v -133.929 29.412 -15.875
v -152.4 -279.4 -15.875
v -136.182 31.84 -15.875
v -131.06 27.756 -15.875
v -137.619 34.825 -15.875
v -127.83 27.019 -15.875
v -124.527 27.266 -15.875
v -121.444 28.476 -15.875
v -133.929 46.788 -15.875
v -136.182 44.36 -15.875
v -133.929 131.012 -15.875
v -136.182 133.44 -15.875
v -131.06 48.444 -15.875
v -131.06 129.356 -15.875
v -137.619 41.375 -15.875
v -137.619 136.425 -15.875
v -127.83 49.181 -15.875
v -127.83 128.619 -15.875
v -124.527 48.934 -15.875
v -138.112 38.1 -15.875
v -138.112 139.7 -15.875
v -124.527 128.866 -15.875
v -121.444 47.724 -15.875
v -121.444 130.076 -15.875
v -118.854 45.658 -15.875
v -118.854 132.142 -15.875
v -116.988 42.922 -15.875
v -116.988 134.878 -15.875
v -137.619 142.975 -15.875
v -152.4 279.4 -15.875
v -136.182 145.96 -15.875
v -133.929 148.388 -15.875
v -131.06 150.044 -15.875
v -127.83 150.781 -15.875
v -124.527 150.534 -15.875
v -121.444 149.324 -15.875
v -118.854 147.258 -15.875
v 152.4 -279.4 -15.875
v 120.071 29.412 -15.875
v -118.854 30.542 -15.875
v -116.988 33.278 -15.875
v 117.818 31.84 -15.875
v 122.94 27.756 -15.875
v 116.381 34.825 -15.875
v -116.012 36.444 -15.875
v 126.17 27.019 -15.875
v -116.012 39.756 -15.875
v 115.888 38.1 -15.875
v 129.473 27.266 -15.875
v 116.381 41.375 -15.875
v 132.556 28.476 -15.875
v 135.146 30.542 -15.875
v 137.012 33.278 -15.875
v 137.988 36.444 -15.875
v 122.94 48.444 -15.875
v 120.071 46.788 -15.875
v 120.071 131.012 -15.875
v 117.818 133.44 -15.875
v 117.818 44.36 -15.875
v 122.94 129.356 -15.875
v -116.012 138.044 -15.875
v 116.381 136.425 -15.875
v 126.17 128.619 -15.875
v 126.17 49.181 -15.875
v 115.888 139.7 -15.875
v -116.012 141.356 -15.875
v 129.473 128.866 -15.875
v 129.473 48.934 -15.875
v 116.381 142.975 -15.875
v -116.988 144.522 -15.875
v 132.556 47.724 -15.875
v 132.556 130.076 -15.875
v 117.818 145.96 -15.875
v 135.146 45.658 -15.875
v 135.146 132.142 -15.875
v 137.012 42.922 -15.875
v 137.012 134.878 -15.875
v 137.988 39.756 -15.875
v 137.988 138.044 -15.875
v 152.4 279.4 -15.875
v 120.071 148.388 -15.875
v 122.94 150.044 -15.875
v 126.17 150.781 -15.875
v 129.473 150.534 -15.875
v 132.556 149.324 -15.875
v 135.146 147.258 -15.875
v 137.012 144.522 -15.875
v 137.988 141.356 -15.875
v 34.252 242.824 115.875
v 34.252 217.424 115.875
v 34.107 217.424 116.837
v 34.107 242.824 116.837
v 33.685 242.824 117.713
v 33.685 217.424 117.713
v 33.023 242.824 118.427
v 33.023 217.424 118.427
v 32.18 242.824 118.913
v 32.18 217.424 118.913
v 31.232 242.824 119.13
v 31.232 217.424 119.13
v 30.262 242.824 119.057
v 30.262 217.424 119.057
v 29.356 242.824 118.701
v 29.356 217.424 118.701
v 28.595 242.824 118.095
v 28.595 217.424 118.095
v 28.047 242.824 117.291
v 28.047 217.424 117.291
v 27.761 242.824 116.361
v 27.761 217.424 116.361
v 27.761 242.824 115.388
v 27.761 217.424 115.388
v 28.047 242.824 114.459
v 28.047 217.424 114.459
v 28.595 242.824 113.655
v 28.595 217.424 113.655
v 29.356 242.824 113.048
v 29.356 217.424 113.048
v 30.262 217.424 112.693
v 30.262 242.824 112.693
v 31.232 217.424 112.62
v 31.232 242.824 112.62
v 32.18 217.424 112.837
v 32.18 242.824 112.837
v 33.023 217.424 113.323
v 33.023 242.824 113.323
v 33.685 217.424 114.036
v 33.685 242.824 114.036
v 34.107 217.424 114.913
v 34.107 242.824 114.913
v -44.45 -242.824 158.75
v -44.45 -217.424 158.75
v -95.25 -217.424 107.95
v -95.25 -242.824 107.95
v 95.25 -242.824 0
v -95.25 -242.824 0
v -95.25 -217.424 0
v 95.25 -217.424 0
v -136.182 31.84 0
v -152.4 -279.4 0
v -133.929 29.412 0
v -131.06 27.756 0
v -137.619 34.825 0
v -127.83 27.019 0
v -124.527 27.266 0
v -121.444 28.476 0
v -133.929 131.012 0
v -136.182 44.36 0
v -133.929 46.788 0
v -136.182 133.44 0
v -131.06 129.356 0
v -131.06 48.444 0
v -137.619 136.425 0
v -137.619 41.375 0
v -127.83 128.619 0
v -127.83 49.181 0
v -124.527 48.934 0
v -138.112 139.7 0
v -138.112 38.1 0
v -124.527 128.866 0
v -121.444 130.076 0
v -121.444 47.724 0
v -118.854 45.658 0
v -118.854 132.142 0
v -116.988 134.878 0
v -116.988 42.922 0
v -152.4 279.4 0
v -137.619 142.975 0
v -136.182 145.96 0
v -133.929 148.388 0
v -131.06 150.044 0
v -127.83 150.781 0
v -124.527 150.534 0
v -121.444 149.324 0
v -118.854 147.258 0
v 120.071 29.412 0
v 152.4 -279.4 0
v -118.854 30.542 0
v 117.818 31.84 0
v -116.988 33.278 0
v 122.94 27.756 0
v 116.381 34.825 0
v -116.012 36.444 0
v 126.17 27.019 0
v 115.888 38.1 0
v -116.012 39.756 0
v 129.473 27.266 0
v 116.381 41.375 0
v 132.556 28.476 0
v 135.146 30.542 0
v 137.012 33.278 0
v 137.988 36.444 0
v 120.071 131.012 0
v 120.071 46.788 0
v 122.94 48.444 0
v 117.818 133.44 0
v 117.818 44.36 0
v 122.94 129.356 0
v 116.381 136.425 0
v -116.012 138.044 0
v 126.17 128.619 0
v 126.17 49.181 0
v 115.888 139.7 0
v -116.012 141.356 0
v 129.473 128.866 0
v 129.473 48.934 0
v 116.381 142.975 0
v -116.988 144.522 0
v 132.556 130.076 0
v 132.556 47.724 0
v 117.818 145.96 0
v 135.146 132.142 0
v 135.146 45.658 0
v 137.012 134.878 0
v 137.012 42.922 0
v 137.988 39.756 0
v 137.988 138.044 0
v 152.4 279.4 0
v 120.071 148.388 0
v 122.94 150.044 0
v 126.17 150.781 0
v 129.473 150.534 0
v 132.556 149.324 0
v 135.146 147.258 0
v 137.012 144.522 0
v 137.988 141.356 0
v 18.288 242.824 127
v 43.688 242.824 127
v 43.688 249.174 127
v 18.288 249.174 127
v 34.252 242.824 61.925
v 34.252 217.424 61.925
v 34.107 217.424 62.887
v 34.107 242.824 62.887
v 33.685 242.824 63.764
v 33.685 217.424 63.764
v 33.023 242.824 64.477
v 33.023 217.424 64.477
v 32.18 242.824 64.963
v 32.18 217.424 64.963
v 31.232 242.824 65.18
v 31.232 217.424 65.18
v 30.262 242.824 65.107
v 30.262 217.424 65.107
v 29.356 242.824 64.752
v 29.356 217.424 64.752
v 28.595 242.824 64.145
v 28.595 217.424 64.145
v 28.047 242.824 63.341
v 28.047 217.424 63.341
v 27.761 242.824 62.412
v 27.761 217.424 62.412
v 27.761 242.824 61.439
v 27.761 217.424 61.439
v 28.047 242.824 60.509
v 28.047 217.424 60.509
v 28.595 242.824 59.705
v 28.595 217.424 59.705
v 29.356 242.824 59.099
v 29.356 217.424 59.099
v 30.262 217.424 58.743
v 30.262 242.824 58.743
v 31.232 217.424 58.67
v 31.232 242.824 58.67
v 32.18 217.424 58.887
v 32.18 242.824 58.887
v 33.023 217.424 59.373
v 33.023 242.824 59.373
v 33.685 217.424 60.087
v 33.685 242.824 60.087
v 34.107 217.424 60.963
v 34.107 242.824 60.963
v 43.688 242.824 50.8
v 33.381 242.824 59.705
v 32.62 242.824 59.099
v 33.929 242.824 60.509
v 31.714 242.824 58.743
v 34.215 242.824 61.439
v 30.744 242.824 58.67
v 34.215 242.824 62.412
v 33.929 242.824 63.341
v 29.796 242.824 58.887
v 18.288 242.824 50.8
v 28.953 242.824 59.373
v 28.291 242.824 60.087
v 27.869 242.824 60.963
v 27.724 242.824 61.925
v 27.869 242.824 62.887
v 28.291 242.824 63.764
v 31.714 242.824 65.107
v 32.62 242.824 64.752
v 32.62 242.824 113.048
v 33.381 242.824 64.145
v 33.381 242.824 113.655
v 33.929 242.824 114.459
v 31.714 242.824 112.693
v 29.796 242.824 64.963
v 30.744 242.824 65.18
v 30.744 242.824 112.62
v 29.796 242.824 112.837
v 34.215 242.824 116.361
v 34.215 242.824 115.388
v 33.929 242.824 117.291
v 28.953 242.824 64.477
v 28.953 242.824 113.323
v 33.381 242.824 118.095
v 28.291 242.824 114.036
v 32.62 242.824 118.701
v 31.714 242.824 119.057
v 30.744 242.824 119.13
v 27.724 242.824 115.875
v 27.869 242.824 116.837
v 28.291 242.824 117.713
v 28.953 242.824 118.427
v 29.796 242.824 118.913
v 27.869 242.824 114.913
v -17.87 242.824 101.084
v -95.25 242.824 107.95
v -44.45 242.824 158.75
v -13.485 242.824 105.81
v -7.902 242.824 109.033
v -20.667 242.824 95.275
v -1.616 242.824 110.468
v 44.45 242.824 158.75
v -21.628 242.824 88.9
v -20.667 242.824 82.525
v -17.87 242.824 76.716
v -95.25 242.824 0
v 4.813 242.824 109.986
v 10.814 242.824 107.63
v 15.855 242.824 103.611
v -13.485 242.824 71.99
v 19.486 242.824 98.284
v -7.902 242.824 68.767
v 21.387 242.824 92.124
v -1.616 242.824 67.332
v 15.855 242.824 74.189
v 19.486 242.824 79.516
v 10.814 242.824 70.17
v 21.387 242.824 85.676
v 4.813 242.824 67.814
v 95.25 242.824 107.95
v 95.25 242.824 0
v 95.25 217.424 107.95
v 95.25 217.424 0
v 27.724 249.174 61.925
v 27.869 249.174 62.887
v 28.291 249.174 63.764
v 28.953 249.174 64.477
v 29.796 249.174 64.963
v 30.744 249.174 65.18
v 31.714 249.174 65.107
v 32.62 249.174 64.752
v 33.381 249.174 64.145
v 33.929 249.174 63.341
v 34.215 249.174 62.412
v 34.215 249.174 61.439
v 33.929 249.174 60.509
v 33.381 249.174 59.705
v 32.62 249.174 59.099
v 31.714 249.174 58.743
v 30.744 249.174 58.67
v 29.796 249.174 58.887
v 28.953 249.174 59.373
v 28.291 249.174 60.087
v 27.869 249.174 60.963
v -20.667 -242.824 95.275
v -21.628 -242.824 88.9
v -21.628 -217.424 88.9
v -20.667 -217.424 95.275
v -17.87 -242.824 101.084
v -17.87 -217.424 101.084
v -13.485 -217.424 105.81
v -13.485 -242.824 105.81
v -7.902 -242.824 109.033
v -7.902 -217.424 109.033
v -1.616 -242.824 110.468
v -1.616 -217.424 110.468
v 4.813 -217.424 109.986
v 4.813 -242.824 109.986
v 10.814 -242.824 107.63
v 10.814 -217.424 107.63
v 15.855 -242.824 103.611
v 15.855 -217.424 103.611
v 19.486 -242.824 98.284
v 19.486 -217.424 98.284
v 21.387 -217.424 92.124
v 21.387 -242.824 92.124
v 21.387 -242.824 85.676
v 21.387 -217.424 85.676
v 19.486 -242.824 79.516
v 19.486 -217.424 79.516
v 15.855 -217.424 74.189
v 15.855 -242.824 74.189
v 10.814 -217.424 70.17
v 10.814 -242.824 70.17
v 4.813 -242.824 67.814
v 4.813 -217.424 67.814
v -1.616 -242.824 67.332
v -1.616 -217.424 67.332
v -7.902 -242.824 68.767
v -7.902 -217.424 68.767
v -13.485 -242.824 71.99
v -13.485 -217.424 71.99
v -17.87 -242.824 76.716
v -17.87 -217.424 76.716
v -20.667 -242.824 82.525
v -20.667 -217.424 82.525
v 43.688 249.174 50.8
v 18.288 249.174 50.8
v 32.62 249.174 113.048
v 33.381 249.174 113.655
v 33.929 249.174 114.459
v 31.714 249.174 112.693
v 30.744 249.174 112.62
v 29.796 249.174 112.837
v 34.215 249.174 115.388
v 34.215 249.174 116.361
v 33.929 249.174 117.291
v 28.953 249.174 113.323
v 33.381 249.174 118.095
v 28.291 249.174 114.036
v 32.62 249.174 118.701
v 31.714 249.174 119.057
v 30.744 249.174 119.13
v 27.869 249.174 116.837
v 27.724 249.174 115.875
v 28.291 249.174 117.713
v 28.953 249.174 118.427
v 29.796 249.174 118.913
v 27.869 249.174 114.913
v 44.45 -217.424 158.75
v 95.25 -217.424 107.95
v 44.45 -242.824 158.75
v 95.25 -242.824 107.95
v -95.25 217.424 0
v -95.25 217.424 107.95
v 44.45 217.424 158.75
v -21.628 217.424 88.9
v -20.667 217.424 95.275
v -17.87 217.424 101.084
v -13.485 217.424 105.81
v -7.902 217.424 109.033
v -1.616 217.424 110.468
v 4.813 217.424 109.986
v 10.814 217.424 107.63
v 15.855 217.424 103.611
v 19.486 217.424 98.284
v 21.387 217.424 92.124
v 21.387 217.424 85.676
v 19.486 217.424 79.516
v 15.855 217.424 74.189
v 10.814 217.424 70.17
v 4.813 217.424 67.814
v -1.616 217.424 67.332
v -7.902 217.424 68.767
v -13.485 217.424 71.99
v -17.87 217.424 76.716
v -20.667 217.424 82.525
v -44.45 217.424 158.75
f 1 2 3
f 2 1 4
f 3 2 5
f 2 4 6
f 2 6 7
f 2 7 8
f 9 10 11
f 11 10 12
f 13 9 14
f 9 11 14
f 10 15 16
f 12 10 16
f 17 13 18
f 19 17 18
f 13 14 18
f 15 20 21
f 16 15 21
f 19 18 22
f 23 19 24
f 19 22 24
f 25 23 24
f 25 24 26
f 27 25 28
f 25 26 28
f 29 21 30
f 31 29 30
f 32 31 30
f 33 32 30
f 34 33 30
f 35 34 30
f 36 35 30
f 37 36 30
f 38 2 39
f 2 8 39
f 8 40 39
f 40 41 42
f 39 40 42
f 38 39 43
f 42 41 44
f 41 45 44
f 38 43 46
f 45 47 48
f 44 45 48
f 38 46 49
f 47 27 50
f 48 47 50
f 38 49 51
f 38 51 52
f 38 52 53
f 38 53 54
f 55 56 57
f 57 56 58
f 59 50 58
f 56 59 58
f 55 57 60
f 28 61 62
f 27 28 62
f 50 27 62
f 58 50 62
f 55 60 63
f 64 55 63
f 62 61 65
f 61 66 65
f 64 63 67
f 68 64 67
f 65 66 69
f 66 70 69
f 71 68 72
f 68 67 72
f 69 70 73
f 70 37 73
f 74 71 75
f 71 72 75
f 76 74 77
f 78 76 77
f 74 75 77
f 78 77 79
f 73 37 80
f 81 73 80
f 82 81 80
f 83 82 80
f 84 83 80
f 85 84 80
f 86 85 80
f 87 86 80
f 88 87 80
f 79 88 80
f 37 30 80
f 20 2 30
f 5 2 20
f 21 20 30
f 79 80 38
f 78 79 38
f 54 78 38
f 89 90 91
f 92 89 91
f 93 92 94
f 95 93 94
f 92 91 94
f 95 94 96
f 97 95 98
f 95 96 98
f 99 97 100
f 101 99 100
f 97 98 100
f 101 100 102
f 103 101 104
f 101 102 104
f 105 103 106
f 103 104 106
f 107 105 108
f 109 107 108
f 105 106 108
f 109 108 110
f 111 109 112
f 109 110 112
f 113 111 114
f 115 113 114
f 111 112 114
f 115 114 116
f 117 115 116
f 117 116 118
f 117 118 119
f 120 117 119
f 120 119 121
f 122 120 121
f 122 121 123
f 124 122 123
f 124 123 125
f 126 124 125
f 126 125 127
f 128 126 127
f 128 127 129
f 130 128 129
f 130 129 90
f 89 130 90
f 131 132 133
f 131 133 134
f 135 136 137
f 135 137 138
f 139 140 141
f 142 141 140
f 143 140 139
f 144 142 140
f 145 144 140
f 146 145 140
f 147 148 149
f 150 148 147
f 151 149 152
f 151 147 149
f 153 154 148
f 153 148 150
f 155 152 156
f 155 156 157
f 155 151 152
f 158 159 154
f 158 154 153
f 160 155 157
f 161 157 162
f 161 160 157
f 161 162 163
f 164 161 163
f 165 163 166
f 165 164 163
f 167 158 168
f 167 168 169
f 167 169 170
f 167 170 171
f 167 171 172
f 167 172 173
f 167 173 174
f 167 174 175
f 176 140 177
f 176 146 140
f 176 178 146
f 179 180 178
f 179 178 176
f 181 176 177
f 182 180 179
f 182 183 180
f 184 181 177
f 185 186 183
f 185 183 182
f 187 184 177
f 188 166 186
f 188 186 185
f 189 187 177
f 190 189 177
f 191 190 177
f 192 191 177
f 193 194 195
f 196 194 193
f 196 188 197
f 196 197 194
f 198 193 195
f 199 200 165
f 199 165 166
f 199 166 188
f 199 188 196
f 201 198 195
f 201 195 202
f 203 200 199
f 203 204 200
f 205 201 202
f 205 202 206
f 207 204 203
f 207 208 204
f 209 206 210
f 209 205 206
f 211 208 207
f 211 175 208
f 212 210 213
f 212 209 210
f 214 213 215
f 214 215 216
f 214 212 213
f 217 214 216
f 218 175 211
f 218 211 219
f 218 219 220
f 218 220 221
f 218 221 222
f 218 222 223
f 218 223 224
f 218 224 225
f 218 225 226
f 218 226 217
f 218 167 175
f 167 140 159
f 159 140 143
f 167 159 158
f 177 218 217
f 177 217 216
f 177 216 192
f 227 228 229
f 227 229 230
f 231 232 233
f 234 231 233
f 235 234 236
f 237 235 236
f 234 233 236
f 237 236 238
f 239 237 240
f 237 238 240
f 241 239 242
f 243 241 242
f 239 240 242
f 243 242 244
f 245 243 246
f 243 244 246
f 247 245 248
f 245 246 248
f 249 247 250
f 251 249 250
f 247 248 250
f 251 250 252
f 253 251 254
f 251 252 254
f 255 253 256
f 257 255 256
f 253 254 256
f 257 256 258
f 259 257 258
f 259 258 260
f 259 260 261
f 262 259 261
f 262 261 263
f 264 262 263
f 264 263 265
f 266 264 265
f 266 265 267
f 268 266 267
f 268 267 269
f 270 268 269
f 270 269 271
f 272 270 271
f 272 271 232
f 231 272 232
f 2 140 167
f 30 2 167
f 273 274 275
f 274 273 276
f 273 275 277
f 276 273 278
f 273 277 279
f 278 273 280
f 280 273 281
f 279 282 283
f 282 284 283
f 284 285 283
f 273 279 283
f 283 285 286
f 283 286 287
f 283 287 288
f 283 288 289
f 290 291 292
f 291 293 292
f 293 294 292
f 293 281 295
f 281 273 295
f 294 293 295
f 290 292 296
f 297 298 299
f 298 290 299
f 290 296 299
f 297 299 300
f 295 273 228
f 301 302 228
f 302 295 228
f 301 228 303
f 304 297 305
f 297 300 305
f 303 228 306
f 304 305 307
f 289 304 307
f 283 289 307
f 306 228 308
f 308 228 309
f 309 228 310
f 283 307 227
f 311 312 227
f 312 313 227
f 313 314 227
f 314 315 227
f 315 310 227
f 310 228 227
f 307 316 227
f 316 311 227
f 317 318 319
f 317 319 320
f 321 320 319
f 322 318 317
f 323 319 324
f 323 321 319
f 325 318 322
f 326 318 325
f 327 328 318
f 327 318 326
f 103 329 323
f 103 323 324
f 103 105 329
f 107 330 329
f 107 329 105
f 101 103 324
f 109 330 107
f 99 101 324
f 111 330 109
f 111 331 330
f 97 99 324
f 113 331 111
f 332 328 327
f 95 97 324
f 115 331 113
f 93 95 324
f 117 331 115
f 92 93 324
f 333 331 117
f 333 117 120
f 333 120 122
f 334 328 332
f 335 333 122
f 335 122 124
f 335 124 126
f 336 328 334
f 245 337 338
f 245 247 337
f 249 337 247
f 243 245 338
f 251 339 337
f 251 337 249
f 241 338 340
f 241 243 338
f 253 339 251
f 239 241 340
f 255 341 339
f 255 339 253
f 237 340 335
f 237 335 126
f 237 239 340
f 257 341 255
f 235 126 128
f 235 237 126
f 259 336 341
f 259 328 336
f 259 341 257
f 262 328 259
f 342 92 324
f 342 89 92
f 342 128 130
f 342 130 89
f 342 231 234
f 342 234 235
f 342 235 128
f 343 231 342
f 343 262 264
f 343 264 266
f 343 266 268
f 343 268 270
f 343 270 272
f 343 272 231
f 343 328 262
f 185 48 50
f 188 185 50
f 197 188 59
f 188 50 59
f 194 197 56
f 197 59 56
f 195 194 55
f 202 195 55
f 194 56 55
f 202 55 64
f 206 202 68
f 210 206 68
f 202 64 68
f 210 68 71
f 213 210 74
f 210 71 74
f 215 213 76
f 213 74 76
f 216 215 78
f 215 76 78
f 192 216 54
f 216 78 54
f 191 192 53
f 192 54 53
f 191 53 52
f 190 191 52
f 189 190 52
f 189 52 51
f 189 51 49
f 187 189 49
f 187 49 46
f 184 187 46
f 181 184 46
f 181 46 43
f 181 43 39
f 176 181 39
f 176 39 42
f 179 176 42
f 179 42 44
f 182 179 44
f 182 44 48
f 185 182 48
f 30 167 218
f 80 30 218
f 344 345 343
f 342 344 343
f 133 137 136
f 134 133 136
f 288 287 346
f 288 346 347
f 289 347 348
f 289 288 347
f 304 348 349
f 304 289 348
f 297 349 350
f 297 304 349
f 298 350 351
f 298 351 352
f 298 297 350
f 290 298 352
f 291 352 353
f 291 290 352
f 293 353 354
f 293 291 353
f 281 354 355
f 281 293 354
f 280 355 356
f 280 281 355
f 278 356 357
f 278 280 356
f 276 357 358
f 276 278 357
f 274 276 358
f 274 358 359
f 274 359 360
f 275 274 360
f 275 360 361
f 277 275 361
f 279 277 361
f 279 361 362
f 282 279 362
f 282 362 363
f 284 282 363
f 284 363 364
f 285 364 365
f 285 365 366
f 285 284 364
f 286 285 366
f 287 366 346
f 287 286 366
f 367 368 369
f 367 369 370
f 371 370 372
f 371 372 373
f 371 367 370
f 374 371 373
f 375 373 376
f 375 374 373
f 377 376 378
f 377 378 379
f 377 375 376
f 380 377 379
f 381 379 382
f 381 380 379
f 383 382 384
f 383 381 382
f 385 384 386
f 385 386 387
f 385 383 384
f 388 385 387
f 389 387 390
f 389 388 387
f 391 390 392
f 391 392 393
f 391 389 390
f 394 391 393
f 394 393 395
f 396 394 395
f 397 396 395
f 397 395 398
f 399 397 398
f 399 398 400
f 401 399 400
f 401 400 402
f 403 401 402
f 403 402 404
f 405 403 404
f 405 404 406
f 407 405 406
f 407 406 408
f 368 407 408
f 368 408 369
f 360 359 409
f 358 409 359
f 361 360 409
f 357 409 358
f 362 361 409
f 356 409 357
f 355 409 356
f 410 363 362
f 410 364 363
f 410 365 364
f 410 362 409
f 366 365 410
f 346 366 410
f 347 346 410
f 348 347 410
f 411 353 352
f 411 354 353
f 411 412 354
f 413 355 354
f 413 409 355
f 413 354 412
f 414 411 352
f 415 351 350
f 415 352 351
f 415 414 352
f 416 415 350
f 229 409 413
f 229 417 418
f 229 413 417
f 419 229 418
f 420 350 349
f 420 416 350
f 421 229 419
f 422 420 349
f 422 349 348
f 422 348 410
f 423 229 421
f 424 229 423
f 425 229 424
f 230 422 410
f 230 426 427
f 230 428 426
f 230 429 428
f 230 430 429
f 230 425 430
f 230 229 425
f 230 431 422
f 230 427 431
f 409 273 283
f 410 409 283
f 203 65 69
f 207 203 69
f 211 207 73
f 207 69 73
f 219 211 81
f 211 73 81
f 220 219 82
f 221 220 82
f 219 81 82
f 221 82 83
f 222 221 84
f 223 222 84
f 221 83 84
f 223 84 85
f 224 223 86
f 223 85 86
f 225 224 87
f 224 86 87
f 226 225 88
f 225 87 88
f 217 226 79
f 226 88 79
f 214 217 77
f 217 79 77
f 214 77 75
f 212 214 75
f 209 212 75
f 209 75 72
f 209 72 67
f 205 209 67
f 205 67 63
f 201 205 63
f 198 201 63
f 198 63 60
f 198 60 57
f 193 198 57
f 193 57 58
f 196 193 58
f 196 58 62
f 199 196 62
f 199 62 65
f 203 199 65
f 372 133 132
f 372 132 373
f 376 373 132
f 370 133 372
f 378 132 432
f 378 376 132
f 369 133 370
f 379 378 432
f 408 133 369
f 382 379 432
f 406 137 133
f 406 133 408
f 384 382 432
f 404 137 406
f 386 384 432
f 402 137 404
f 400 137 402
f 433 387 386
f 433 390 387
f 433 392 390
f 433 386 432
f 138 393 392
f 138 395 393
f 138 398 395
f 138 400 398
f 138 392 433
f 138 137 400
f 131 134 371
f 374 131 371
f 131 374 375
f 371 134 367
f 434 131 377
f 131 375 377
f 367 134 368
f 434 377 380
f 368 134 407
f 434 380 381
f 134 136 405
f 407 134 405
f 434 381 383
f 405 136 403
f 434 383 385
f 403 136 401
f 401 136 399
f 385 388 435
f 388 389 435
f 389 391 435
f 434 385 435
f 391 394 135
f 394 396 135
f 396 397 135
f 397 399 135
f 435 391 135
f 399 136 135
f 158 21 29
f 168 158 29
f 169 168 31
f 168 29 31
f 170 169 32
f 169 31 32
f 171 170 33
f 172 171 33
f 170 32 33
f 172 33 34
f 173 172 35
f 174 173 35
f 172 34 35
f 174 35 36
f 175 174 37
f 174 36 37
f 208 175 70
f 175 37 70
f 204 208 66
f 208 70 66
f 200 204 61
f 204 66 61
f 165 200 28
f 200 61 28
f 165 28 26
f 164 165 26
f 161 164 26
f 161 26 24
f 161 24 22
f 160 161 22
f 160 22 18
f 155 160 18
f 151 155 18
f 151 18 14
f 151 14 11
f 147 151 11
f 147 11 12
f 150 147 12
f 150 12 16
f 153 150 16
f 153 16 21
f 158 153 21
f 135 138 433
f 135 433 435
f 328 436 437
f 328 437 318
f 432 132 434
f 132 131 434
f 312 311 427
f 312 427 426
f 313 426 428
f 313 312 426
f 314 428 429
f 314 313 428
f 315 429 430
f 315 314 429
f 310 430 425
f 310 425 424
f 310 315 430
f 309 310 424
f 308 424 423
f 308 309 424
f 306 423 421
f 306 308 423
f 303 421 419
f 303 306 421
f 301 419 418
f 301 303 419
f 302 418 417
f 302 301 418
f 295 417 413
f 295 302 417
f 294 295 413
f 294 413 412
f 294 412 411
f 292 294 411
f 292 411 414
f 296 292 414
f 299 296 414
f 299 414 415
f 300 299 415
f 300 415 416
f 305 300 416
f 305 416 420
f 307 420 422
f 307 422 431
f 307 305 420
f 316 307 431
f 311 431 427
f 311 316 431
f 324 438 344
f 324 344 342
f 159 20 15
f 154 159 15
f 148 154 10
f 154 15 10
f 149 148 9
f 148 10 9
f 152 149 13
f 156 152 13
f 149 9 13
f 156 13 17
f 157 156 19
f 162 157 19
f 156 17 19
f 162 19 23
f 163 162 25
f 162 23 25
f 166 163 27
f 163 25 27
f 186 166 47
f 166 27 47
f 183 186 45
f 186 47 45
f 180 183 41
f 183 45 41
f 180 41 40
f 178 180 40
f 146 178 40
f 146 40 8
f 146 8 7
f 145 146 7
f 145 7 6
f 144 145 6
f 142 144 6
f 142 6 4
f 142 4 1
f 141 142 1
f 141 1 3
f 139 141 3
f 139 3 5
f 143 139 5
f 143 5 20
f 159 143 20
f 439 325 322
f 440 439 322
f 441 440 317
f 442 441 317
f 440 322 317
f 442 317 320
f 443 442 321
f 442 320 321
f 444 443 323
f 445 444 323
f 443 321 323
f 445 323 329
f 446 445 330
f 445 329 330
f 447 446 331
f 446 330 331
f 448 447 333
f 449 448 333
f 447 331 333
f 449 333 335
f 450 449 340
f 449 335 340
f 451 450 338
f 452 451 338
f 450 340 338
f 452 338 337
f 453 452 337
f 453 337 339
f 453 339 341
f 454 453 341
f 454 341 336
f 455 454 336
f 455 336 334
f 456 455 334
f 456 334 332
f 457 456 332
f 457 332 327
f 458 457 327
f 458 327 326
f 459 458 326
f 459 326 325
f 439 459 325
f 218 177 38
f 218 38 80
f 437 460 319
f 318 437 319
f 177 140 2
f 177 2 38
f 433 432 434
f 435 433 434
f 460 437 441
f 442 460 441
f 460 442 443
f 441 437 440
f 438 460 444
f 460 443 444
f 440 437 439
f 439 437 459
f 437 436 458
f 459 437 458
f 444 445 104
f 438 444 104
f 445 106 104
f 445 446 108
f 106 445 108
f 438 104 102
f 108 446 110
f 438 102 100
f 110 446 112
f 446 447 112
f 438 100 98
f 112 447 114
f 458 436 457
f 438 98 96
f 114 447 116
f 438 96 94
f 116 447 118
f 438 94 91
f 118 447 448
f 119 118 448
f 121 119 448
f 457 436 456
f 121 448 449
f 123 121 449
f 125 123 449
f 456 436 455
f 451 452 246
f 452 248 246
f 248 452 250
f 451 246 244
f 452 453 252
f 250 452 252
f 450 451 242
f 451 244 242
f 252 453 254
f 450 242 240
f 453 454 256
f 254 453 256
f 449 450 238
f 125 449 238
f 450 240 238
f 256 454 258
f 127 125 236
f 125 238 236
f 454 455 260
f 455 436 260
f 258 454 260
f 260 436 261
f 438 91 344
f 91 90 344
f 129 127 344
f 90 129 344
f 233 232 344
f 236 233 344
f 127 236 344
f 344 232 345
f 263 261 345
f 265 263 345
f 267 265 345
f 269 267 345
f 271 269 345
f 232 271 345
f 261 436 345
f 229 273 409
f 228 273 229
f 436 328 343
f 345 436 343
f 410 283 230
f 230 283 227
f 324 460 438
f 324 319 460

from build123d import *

# Parameters (mm, degrees)
F0_W      = 304.8
F0_H      = 558.8
F1_DEPTH  = 15.875
F3_D      = 22.225
F4_W      = 190.5
F4_H      = 25.4
F5_DEPTH  = 158.75
F6_SIZE   = 50.8
F8_R      = 21.6281
F9_DEPTH  = 522.225
F12_D     = 6.5278
F13_W     = 25.4
F13_H     = 76.2
F13_R     = 3.2639
F14_DEPTH = 6.35


# Not quite as in the source:
# - a length typed as a fraction of an inch, garbled in the dataset ("3 / 203.2 mm" for 3/8 in), is restored


with BuildPart() as f1:
    # F0 (on Top) → F1 (new body)
    with BuildSketch(Plane.XY):
        Rectangle(F0_W, F0_H)
    extrude(amount=-F1_DEPTH)

    # F3 (through all)
    with Locations(Plane.XY):
        with Locations((-127, 139.7), (127, 139.7), (127, 38.1), (-127, 38.1)):
            Hole(F3_D / 2)


with BuildPart() as f5:
    # F4 (on face) → F5 (new body)
    with BuildSketch(Plane.XY):
        with Locations((0, 230.124)):
            Rectangle(F4_W, F4_H)
    extrude(amount=F5_DEPTH)

    # F6
    f6_edges = [f5.edges().sort_by_distance(p)[0] for p in [
        (95.25, 230.124, 158.75),
        (-95.25, 230.124, 158.75),
    ]]
    chamfer(f6_edges, length=F6_SIZE)

    # F8 (on face) → F9 (cut, through all)
    with BuildSketch(Plane(origin=(0, 242.824, 0), x_dir=(-1, 0, 0), z_dir=(0, 1, 0))):
        with Locations((0, 88.9)):
            Circle(F8_R)
    extrude(amount=-F9_DEPTH, mode=Mode.SUBTRACT)


with BuildPart() as f10_1:
    # F10: instance of F5
    add(f5.part.mirror(Plane.XZ))


with BuildPart() as f5_1:
    add(f5.part)

    # F12 (through all)
    with Locations(Plane(origin=(0, 242.824, 0), x_dir=(-1, 0, 0), z_dir=(0, 1, 0))):
        with Locations((-30.988, 115.8748), (-30.988, 61.9252)):
            Hole(F12_D / 2)


with BuildPart() as f14:
    # F13 (on face) → F14 (new body)
    with BuildSketch(Plane(origin=(0, 242.824, 0), x_dir=(-1, 0, 0), z_dir=(0, 1, 0))):
        with Locations((-30.988, 88.9)):
            Rectangle(F13_W, F13_H)
        with Locations((-30.988, 61.9252)):
            Circle(F13_R, mode=Mode.SUBTRACT)
        with Locations((-30.988, 115.8748)):
            Circle(F13_R, mode=Mode.SUBTRACT)
    extrude(amount=F14_DEPTH)


solid = Compound([f1.part, f10_1.part, f5_1.part, f14.part])
